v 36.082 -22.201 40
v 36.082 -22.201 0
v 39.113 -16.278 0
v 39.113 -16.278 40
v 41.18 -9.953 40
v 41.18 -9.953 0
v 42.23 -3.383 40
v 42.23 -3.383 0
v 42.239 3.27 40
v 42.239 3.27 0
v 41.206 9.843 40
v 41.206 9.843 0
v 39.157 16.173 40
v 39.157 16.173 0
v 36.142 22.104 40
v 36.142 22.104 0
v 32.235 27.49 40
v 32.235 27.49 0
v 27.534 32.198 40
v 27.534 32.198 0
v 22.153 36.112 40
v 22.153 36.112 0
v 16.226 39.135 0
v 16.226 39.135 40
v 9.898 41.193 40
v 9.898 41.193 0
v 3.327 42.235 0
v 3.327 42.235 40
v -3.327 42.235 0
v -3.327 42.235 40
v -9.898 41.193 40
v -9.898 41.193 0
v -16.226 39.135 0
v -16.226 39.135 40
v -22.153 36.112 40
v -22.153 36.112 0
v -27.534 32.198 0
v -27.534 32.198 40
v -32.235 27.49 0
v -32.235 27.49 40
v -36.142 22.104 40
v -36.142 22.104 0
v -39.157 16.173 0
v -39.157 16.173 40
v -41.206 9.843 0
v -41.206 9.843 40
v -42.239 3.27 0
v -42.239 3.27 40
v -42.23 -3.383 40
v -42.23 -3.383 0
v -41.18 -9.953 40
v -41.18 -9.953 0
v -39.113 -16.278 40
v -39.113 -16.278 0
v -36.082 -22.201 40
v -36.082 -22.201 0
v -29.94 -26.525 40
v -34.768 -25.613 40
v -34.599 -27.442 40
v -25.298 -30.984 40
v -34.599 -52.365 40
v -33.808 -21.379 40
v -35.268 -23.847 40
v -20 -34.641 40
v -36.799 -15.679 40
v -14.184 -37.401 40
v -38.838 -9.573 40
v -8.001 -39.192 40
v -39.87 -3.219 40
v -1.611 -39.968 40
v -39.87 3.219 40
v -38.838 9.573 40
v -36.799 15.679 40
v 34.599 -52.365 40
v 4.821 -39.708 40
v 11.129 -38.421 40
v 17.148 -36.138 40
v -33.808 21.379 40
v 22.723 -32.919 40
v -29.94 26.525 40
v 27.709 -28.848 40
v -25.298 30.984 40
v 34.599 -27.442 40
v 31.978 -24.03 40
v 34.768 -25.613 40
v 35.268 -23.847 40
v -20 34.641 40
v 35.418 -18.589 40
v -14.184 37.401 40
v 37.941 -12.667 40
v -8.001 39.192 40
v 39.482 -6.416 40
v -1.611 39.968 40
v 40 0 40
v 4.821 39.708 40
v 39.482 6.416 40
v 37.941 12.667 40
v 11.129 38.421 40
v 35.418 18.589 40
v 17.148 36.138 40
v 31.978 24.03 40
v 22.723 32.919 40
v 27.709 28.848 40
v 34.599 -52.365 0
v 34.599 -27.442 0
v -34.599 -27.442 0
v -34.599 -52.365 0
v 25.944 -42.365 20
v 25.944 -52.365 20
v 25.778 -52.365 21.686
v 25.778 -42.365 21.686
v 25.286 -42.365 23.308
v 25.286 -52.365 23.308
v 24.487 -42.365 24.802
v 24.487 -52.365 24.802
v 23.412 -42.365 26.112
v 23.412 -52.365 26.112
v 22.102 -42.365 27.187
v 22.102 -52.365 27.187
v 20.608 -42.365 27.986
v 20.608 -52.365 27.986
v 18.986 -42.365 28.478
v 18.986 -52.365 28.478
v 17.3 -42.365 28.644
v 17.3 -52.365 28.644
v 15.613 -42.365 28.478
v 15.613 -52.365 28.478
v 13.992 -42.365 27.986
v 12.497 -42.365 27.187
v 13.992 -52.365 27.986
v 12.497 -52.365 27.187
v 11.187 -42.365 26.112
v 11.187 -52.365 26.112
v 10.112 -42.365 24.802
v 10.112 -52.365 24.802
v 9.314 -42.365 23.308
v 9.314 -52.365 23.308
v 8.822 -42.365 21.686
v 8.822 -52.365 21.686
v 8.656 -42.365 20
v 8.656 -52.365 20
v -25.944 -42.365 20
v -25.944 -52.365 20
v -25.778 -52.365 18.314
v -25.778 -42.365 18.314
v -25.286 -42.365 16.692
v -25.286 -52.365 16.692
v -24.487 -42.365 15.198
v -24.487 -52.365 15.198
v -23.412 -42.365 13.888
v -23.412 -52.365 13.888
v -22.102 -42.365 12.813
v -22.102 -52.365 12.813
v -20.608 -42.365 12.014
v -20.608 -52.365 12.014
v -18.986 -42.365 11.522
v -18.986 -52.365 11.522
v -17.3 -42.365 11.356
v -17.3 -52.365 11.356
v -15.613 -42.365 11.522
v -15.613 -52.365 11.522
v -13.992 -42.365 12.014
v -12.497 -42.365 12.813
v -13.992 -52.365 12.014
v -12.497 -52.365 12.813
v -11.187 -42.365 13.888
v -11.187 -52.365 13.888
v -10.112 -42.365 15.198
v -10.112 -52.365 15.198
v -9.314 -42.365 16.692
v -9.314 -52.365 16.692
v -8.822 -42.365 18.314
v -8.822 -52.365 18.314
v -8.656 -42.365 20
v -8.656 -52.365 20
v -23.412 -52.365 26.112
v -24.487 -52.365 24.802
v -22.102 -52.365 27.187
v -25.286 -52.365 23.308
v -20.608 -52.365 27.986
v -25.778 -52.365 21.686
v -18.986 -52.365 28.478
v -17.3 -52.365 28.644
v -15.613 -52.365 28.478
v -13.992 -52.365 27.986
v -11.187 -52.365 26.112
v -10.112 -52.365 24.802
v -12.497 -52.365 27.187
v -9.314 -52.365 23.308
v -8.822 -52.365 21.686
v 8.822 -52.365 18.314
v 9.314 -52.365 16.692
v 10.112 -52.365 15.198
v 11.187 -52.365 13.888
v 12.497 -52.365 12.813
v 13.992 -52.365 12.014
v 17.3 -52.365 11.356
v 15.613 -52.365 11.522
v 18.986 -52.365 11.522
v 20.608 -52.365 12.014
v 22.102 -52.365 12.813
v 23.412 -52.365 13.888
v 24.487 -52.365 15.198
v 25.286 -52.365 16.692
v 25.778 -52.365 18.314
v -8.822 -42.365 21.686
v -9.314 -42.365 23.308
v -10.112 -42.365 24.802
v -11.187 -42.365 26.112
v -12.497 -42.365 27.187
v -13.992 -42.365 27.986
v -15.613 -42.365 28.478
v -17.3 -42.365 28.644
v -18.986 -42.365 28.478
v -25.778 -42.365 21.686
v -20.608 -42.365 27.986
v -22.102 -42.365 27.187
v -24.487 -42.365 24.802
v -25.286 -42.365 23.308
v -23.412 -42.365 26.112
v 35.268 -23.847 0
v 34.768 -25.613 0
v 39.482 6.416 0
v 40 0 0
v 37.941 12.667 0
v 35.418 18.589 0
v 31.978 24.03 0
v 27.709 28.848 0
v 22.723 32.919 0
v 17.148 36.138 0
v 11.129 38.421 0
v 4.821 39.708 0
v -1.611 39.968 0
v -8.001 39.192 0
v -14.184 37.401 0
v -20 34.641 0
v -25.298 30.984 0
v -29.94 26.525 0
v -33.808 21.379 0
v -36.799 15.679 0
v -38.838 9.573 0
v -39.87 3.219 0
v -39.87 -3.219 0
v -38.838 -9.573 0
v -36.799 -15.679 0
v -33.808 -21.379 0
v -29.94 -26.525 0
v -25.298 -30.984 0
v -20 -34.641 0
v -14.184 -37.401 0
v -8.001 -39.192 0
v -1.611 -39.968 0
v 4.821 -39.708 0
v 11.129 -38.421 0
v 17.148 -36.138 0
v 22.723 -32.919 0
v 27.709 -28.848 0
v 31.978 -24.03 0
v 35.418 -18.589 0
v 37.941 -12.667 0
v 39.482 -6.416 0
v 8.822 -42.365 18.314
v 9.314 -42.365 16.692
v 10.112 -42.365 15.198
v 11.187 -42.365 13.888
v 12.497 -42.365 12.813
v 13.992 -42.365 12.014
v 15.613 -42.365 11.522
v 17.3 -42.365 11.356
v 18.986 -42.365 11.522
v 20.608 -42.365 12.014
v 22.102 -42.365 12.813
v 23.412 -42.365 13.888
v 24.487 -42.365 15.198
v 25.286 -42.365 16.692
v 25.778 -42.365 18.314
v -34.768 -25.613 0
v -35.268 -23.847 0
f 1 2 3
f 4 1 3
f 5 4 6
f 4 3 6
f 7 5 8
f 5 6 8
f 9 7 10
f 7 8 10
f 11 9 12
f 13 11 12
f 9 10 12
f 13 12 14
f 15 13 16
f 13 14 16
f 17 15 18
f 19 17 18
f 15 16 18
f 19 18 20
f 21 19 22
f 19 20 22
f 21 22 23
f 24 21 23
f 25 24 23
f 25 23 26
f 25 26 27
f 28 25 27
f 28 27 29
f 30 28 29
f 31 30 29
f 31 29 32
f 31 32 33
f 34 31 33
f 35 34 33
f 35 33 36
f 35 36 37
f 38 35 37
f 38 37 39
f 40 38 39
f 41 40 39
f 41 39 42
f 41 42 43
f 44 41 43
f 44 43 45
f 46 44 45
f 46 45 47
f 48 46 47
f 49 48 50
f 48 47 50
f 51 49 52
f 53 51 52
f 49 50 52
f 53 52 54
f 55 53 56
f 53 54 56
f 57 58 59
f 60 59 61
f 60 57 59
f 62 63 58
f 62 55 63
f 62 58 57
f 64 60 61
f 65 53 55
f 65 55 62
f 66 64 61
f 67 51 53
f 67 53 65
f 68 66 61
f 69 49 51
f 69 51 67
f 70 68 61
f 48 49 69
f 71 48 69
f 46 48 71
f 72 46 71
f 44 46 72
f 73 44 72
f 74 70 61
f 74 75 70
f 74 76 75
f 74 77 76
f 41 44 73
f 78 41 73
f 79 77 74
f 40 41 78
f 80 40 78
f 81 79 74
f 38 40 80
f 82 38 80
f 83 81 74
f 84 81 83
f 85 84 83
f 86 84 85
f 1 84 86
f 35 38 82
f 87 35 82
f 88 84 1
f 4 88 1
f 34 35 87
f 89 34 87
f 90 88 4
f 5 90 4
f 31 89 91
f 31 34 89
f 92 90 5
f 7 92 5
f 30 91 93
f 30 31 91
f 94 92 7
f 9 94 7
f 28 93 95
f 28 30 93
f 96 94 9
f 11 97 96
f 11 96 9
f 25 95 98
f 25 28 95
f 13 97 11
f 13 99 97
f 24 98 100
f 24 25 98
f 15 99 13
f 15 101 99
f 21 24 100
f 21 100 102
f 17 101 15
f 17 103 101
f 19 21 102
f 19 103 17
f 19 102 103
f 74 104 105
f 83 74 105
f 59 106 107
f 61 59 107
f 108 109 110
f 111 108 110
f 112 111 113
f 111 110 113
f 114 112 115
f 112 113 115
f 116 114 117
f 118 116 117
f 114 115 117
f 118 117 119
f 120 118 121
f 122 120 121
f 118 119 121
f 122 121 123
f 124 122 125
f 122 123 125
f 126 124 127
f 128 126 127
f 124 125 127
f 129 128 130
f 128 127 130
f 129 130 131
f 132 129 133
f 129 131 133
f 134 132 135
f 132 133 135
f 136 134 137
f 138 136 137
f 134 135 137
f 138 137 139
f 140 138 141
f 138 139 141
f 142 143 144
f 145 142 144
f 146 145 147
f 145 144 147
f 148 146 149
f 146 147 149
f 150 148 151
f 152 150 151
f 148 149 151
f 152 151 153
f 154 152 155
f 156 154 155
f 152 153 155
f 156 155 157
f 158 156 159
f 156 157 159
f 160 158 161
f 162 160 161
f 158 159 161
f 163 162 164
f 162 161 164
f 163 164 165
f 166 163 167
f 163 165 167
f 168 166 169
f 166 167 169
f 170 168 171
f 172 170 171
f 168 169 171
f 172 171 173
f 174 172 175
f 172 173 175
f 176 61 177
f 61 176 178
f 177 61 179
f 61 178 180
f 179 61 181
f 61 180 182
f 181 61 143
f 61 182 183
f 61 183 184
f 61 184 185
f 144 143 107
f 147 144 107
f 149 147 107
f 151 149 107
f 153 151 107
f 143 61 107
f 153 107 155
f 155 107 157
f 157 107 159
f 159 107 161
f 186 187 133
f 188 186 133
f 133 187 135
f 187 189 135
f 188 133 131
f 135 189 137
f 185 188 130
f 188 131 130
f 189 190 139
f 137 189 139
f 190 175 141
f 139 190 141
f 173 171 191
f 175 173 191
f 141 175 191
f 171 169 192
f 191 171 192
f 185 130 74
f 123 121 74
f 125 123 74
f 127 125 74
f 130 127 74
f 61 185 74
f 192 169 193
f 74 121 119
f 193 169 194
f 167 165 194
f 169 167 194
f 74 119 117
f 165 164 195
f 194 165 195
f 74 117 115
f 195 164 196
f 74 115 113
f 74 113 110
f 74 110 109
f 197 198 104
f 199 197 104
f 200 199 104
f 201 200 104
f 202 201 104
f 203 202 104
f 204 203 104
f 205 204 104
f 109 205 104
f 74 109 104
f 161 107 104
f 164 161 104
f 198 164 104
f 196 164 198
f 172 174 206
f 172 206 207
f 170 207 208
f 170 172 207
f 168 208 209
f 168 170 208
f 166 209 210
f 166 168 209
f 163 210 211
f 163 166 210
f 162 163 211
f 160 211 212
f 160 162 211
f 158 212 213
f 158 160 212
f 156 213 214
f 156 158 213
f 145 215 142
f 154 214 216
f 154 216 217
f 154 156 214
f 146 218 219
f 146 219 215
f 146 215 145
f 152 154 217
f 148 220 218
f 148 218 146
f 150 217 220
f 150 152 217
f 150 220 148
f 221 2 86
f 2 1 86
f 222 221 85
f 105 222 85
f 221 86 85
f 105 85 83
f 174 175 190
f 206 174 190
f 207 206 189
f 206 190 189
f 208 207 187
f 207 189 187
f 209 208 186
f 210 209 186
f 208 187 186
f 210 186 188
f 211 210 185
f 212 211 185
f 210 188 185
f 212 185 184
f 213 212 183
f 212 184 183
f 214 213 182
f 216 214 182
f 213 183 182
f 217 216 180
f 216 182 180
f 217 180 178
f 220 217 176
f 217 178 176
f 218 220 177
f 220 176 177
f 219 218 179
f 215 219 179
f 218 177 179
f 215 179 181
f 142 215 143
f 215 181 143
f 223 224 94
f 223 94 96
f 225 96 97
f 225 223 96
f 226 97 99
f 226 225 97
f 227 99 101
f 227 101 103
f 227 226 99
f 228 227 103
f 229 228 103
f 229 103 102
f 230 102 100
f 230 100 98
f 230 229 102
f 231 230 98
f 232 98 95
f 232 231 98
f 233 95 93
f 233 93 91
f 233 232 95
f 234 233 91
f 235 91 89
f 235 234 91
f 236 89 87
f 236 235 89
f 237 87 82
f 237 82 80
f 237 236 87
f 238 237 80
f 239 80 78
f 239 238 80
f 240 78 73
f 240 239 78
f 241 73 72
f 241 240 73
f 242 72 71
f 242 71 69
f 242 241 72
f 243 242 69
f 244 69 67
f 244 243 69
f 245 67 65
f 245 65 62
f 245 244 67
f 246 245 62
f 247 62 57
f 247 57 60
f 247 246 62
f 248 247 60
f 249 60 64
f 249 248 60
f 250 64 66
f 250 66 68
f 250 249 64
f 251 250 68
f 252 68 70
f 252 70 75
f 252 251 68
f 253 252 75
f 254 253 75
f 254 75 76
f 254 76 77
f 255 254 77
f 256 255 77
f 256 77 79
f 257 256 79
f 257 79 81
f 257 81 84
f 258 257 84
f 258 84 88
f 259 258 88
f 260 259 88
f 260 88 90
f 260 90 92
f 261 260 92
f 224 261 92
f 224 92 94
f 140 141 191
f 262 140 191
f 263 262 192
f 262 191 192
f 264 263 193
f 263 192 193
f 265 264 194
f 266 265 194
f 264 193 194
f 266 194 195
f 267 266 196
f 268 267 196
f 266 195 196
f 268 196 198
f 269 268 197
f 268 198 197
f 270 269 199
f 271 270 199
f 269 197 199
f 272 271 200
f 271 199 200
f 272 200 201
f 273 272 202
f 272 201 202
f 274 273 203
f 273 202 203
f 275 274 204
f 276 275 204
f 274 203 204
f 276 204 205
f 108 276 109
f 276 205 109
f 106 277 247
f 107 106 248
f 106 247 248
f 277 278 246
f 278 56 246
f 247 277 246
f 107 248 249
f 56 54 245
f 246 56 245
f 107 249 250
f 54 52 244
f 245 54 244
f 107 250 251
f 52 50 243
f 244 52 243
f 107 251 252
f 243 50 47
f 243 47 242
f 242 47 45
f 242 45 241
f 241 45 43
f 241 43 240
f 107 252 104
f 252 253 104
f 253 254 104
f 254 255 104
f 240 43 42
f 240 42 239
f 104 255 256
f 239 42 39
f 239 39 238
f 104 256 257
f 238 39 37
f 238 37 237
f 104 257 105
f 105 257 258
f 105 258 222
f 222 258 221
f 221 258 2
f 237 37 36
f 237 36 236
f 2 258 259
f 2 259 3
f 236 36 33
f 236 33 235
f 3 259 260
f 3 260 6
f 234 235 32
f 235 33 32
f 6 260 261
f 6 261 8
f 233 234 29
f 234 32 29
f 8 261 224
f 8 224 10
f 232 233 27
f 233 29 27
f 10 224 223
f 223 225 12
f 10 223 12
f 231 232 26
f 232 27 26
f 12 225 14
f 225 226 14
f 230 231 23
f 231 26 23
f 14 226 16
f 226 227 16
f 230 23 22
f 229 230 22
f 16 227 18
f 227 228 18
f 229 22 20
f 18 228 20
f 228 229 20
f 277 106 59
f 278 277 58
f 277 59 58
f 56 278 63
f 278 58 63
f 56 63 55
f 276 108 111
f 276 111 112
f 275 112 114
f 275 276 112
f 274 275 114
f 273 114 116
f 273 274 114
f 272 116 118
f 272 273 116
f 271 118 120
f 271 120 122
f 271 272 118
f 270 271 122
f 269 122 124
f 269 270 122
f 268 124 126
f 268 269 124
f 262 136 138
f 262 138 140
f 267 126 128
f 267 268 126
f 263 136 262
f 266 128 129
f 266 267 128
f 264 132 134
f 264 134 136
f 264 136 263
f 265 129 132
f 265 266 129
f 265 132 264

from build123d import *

# Parameters (mm, degrees)
SKETCH1_R           = 40
BOSS_EXTRUDE1_DEPTH = 40
CUT_EXTRUDE2_DEPTH  = 10
FILLET1_R           = 10


with BuildPart() as part:
    # Sketch1 → Boss-Extrude1 (new body)
    with BuildSketch(Plane.XY):
        with BuildLine():
            Line((-34.599296367, -24.44828034), (-34.599296367, -52.365409812))
            Line((-34.599296367, -52.365409812), (34.599296367, -52.365409812))
            Line((34.599296367, -52.365409812), (34.599296367, -24.44828034))
            ThreePointArc((34.599296367, -24.44828034), (0, 42.365430727), (-34.599296367, -24.44828034))
        make_face()
        Circle(SKETCH1_R, mode=Mode.SUBTRACT)
    extrude(amount=BOSS_EXTRUDE1_DEPTH)

    # Sketch4 → Cut-Extrude2 (cut)
    with BuildSketch(Plane(origin=(0, -52.365409812, 0), x_dir=(-1, 0, 0), z_dir=(0, -1, 0))):
        with BuildLine():
            ThreePointArc((8.655703751, -20), (17.299648183, -28.643944432), (25.943592616, -20))
            Line((25.943592616, -20), (8.655703751, -20))
        make_face()
        with BuildLine():
            Line((8.655703751, -20), (25.943592616, -20))
            ThreePointArc((25.943592616, -20), (17.299648183, -11.356055568), (8.655703751, -20))
        make_face()
        with BuildLine():
            ThreePointArc((-25.943592616, -20), (-17.299648183, -28.643944432), (-8.655703751, -20))
            Line((-8.655703751, -20), (-25.943592616, -20))
        make_face()
        with BuildLine():
            Line((-25.943592616, -20), (-8.655703751, -20))
            ThreePointArc((-8.655703751, -20), (-17.299648183, -11.356055568), (-25.943592616, -20))
        make_face()
    extrude(amount=-CUT_EXTRUDE2_DEPTH, mode=Mode.SUBTRACT)

    # Fillet1
    fillet1_edges = [part.edges().sort_by_distance(p)[0] for p in [
        (-34.599296367, -24.44828034, 20),
        (34.599296367, -24.44828034, 20),
    ]]
    fillet(fillet1_edges, radius=FILLET1_R)


solid = part.part
